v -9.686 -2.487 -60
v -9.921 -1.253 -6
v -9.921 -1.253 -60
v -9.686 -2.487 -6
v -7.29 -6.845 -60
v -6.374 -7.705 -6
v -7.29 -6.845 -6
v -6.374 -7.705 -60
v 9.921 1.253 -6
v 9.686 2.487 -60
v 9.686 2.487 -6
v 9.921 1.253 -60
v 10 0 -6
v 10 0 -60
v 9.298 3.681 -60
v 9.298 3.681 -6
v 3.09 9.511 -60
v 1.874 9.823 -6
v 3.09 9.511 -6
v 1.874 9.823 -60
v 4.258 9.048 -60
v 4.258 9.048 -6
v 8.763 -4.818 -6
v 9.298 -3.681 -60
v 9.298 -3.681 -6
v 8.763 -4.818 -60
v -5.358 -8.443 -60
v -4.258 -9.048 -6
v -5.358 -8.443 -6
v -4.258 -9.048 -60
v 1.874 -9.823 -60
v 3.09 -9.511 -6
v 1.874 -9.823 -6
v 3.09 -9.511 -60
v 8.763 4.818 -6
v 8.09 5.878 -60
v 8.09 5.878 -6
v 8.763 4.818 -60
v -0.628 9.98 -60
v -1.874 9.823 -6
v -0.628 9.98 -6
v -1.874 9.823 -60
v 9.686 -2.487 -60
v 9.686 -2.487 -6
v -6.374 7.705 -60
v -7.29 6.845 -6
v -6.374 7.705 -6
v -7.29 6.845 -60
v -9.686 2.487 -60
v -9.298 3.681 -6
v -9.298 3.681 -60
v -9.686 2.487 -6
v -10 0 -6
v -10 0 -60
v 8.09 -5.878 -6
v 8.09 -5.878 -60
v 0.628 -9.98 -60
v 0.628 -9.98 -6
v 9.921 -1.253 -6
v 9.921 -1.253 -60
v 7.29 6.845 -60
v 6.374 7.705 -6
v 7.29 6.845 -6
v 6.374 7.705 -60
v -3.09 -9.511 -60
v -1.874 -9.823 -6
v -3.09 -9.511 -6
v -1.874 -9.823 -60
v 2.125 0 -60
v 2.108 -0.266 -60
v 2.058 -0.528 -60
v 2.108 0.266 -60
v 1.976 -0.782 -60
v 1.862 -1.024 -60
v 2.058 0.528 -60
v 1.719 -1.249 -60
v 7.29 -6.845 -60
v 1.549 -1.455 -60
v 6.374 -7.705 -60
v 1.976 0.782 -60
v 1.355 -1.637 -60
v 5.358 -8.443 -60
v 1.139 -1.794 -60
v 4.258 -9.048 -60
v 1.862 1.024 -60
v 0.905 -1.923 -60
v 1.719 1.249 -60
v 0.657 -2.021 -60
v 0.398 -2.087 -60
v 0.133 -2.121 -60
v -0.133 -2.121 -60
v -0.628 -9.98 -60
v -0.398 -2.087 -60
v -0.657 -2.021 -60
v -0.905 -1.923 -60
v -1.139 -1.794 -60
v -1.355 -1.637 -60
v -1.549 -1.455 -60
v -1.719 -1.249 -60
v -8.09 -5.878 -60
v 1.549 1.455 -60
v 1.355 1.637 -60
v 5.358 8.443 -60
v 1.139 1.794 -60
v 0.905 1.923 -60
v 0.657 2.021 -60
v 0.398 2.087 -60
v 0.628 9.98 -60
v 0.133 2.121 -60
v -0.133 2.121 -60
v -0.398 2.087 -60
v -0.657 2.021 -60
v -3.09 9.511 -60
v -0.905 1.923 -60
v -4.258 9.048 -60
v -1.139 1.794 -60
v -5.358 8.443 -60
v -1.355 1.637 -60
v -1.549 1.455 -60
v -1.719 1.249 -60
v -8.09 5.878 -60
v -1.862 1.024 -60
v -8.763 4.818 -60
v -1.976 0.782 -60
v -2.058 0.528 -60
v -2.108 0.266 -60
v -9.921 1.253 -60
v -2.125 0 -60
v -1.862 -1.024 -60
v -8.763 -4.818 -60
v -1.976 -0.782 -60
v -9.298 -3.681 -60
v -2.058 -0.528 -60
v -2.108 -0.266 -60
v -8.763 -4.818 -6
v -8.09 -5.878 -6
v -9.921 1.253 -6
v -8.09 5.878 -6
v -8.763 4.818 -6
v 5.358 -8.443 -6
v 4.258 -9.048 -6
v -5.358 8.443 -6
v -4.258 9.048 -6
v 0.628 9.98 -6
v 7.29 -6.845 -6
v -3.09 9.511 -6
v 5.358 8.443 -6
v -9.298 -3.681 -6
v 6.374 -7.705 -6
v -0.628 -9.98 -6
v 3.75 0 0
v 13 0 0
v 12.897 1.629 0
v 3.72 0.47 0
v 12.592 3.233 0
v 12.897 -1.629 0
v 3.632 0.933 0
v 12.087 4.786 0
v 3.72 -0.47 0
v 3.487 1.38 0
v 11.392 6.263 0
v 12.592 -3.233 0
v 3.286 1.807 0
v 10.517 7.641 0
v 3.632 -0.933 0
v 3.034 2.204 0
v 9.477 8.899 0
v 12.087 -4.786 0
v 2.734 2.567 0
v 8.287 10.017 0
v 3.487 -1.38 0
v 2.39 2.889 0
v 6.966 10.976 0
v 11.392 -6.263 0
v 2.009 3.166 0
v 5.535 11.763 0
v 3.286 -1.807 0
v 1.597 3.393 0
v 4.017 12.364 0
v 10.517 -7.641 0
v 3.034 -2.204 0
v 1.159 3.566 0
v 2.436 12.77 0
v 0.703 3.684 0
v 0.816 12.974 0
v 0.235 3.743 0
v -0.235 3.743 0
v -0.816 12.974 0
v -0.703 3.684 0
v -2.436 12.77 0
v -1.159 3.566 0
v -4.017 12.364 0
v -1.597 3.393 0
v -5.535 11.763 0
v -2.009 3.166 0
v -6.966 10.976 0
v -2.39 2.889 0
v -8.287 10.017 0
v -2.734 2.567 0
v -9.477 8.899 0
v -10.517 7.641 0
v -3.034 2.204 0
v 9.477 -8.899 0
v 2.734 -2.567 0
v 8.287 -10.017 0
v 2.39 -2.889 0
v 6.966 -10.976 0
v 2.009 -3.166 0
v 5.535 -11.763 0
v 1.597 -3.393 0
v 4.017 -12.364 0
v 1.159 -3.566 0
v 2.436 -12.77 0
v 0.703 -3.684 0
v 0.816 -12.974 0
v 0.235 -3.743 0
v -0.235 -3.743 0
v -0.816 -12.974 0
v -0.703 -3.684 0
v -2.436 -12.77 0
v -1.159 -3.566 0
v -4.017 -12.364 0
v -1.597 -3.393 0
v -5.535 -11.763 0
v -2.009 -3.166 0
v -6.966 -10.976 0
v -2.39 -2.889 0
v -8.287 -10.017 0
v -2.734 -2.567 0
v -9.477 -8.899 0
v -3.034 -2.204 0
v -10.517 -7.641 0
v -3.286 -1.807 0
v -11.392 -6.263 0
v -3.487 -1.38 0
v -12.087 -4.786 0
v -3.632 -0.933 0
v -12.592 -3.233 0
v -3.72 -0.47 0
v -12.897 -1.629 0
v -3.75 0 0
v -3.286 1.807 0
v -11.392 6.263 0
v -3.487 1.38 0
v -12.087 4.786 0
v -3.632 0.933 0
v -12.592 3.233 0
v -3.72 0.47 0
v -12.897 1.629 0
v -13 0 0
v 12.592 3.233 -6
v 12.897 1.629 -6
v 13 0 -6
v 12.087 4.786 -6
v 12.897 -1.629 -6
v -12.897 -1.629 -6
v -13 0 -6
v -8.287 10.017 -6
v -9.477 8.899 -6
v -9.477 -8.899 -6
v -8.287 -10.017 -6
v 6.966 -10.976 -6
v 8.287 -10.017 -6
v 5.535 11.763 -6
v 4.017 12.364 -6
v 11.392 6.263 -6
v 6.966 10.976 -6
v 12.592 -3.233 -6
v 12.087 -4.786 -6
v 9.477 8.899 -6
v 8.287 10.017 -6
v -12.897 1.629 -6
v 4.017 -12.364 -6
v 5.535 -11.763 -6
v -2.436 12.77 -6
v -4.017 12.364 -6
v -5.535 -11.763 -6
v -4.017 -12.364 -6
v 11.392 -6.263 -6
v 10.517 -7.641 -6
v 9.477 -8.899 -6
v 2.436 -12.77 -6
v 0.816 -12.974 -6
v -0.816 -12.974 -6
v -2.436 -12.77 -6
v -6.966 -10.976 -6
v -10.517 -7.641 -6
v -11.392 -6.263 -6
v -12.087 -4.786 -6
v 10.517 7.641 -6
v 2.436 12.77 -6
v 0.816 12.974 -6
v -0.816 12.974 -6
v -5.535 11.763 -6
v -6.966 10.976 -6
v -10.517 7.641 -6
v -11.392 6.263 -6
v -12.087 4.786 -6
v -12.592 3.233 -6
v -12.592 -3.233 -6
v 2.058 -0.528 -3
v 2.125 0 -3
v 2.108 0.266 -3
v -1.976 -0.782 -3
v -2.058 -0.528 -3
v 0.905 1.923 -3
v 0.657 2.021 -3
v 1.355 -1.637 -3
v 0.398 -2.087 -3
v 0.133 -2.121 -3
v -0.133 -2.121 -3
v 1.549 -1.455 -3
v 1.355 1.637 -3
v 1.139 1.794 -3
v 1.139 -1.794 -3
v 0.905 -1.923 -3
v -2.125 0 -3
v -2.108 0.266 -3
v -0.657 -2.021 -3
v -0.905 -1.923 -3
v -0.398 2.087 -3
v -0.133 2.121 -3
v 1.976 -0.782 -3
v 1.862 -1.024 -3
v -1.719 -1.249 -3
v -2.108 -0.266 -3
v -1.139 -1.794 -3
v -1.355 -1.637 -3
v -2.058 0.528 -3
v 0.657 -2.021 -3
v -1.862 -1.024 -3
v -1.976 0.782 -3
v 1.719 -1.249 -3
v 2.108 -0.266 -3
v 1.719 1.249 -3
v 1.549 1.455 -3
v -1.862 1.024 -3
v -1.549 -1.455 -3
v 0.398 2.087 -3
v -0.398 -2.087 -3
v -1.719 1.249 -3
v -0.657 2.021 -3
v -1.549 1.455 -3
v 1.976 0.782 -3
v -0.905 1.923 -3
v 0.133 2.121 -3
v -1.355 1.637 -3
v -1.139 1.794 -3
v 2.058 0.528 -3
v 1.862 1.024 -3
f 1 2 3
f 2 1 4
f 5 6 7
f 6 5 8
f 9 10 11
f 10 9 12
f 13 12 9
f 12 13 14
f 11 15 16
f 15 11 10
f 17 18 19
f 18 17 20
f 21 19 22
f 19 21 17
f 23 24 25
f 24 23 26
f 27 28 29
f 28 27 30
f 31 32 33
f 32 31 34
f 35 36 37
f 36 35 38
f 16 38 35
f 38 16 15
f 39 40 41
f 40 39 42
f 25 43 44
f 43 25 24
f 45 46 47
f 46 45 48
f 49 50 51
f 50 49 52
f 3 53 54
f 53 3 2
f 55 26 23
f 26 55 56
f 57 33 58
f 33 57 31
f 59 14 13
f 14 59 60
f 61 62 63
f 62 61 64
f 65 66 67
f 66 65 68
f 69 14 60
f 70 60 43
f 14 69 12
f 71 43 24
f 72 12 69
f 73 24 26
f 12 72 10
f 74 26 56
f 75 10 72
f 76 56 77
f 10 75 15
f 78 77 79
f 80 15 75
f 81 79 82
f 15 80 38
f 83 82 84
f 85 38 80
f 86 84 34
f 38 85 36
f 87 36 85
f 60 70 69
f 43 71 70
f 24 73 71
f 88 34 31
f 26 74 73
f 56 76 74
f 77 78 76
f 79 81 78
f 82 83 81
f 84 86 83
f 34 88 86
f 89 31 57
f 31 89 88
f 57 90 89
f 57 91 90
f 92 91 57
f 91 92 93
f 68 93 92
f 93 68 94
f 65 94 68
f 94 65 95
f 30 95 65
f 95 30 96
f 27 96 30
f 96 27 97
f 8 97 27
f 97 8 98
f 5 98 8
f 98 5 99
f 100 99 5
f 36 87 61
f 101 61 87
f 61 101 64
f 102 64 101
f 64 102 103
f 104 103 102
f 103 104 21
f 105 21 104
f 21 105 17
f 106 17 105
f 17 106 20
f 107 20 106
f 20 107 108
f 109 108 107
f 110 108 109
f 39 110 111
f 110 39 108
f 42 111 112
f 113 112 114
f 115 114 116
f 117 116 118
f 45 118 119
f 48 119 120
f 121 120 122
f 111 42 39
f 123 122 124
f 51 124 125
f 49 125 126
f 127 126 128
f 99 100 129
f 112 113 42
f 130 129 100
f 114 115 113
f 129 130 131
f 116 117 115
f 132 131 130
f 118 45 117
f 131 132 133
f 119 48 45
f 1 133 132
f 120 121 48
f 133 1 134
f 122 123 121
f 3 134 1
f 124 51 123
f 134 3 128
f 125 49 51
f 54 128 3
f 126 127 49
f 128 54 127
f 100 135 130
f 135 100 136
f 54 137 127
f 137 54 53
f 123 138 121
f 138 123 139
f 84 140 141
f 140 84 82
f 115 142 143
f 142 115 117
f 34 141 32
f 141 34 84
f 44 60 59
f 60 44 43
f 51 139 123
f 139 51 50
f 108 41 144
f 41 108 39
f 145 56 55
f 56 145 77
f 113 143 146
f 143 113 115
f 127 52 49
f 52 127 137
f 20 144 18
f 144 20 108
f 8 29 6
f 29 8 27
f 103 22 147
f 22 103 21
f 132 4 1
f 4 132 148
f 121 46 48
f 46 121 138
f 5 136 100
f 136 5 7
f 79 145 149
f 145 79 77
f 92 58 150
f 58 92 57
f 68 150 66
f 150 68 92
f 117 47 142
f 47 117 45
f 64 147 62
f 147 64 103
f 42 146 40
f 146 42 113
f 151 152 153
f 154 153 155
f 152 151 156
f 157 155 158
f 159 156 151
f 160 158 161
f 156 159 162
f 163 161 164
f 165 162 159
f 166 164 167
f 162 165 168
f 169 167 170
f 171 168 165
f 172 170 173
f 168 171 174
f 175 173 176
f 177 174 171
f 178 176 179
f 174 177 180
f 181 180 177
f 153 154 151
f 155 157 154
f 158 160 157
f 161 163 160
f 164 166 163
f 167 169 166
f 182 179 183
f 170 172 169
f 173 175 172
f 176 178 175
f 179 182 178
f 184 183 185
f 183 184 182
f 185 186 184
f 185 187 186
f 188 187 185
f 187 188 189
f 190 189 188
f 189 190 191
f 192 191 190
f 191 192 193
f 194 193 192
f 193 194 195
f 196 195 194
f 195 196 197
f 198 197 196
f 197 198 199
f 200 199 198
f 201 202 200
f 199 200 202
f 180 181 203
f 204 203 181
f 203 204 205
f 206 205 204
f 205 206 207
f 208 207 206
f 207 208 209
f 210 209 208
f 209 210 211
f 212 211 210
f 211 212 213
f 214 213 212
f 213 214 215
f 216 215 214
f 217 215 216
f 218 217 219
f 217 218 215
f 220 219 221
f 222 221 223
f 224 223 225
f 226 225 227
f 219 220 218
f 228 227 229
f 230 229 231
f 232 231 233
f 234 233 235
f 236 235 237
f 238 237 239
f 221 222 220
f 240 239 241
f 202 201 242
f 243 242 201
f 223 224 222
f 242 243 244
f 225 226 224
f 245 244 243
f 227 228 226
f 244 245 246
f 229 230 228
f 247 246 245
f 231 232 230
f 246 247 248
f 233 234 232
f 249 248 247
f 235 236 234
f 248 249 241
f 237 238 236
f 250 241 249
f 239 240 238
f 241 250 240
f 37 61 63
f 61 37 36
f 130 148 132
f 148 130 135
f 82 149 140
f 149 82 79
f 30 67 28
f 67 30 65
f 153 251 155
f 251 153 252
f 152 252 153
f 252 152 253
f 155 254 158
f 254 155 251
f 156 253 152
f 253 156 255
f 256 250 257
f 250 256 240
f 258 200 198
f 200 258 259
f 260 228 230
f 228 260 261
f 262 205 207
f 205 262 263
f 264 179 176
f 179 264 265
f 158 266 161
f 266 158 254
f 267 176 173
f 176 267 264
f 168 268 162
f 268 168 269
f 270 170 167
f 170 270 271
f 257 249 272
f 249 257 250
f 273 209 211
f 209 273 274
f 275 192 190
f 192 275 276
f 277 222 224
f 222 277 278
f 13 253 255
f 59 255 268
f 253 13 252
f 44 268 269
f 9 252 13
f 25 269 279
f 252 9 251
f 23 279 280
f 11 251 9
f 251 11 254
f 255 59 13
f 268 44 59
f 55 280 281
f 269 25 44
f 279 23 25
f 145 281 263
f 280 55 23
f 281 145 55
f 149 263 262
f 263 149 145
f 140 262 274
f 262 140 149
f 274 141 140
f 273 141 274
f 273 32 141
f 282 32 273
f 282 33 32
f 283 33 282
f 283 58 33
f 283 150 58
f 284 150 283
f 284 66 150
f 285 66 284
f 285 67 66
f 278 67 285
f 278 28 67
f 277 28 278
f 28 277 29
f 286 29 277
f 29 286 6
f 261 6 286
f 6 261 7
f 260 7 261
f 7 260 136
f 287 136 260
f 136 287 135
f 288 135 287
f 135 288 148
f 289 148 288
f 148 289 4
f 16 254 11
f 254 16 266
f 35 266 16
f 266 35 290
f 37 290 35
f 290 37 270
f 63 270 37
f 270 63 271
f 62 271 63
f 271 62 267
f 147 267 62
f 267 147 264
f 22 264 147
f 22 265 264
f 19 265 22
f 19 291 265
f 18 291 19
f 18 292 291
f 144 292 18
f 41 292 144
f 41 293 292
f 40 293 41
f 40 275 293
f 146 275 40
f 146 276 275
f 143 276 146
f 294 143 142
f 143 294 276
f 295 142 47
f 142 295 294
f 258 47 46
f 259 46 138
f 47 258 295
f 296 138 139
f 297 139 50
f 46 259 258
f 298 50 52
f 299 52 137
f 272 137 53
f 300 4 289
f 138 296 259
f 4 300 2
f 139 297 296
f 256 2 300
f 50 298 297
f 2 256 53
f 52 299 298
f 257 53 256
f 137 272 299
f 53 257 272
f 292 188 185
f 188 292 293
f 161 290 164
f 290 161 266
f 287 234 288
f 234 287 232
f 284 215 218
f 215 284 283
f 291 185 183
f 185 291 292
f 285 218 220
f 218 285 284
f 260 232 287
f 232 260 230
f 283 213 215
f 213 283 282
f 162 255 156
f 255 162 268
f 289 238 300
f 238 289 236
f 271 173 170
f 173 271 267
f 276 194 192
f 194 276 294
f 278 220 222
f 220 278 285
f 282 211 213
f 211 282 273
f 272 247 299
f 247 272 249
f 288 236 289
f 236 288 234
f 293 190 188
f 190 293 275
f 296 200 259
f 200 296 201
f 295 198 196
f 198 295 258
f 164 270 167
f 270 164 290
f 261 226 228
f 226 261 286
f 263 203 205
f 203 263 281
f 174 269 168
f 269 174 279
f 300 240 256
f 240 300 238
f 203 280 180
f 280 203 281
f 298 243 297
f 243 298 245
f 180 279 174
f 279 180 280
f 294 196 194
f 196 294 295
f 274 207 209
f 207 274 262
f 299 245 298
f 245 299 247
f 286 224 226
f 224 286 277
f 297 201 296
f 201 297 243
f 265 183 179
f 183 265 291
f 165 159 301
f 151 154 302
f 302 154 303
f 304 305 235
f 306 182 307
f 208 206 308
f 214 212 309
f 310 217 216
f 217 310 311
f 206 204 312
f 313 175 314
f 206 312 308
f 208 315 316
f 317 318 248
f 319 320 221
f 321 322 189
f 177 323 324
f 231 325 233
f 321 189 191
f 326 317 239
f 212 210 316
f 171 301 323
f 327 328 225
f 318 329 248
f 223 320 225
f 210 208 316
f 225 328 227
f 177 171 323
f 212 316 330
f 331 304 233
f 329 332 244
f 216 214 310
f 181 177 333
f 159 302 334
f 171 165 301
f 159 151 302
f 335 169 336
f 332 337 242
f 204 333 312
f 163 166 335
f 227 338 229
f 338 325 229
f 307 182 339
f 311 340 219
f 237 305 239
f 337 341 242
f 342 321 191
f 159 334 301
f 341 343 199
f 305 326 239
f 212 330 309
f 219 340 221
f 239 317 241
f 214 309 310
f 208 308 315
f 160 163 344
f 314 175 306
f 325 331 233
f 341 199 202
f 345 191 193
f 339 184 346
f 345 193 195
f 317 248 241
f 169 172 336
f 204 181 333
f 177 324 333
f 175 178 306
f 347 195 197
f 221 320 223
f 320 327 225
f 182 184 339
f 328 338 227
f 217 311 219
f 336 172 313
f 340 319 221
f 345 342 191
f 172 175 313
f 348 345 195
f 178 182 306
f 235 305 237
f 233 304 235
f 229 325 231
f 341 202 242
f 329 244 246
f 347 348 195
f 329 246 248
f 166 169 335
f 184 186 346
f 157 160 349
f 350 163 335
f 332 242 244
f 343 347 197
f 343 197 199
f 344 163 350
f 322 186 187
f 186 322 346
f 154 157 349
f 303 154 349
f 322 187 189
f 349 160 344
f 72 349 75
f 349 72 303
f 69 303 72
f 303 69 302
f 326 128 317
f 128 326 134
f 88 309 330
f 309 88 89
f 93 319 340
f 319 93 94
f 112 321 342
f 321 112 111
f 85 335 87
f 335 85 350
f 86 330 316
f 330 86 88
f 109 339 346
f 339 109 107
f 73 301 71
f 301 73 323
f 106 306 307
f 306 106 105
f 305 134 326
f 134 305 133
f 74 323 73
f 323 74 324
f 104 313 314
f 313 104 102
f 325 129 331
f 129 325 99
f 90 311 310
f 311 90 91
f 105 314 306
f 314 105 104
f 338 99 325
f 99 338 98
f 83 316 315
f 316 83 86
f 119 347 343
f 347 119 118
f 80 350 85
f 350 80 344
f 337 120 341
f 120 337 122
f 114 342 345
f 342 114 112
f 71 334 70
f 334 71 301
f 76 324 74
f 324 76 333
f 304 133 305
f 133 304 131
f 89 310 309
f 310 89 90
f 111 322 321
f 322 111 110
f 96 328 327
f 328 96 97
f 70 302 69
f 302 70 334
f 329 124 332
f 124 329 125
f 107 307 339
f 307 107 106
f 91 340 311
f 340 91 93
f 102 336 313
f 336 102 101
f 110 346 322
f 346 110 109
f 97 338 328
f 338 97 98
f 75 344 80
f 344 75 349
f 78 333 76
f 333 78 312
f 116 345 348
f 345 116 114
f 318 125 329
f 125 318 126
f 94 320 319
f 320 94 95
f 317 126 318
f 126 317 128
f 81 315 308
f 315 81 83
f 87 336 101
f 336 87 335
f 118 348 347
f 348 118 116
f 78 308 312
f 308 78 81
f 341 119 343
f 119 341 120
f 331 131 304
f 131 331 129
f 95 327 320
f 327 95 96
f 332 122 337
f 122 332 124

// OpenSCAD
$fn = 50;


difference() {
	union() {
		translate(v = [0, 0, -60.0000000000]) {
			cylinder(h = 60, r = 10.0000000000);
		}
		translate(v = [0, 0, -6.0000000000]) {
			cylinder(h = 6, r = 13.0000000000);
		}
	}
	union() {
		translate(v = [0, 0, 0]) {
			rotate(a = [0, 0, 0]) {
				difference() {
					union() {
						#translate(v = [0, 0, -60.0000000000]) {
							cylinder(h = 60, r = 2.0000000000);
						}
						#translate(v = [0, 0, -3]) {
							cylinder(h = 3, r1 = 2.1250000000, r2 = 3.7500000000);
						}
						#translate(v = [0, 0, -60.0000000000]) {
							cylinder(h = 60, r = 2.1250000000);
						}
						#translate(v = [0, 0, -60.0000000000]) {
							cylinder(h = 60, r = 2.0000000000);
						}
					}
					union();
				}
			}
		}
	}
}
